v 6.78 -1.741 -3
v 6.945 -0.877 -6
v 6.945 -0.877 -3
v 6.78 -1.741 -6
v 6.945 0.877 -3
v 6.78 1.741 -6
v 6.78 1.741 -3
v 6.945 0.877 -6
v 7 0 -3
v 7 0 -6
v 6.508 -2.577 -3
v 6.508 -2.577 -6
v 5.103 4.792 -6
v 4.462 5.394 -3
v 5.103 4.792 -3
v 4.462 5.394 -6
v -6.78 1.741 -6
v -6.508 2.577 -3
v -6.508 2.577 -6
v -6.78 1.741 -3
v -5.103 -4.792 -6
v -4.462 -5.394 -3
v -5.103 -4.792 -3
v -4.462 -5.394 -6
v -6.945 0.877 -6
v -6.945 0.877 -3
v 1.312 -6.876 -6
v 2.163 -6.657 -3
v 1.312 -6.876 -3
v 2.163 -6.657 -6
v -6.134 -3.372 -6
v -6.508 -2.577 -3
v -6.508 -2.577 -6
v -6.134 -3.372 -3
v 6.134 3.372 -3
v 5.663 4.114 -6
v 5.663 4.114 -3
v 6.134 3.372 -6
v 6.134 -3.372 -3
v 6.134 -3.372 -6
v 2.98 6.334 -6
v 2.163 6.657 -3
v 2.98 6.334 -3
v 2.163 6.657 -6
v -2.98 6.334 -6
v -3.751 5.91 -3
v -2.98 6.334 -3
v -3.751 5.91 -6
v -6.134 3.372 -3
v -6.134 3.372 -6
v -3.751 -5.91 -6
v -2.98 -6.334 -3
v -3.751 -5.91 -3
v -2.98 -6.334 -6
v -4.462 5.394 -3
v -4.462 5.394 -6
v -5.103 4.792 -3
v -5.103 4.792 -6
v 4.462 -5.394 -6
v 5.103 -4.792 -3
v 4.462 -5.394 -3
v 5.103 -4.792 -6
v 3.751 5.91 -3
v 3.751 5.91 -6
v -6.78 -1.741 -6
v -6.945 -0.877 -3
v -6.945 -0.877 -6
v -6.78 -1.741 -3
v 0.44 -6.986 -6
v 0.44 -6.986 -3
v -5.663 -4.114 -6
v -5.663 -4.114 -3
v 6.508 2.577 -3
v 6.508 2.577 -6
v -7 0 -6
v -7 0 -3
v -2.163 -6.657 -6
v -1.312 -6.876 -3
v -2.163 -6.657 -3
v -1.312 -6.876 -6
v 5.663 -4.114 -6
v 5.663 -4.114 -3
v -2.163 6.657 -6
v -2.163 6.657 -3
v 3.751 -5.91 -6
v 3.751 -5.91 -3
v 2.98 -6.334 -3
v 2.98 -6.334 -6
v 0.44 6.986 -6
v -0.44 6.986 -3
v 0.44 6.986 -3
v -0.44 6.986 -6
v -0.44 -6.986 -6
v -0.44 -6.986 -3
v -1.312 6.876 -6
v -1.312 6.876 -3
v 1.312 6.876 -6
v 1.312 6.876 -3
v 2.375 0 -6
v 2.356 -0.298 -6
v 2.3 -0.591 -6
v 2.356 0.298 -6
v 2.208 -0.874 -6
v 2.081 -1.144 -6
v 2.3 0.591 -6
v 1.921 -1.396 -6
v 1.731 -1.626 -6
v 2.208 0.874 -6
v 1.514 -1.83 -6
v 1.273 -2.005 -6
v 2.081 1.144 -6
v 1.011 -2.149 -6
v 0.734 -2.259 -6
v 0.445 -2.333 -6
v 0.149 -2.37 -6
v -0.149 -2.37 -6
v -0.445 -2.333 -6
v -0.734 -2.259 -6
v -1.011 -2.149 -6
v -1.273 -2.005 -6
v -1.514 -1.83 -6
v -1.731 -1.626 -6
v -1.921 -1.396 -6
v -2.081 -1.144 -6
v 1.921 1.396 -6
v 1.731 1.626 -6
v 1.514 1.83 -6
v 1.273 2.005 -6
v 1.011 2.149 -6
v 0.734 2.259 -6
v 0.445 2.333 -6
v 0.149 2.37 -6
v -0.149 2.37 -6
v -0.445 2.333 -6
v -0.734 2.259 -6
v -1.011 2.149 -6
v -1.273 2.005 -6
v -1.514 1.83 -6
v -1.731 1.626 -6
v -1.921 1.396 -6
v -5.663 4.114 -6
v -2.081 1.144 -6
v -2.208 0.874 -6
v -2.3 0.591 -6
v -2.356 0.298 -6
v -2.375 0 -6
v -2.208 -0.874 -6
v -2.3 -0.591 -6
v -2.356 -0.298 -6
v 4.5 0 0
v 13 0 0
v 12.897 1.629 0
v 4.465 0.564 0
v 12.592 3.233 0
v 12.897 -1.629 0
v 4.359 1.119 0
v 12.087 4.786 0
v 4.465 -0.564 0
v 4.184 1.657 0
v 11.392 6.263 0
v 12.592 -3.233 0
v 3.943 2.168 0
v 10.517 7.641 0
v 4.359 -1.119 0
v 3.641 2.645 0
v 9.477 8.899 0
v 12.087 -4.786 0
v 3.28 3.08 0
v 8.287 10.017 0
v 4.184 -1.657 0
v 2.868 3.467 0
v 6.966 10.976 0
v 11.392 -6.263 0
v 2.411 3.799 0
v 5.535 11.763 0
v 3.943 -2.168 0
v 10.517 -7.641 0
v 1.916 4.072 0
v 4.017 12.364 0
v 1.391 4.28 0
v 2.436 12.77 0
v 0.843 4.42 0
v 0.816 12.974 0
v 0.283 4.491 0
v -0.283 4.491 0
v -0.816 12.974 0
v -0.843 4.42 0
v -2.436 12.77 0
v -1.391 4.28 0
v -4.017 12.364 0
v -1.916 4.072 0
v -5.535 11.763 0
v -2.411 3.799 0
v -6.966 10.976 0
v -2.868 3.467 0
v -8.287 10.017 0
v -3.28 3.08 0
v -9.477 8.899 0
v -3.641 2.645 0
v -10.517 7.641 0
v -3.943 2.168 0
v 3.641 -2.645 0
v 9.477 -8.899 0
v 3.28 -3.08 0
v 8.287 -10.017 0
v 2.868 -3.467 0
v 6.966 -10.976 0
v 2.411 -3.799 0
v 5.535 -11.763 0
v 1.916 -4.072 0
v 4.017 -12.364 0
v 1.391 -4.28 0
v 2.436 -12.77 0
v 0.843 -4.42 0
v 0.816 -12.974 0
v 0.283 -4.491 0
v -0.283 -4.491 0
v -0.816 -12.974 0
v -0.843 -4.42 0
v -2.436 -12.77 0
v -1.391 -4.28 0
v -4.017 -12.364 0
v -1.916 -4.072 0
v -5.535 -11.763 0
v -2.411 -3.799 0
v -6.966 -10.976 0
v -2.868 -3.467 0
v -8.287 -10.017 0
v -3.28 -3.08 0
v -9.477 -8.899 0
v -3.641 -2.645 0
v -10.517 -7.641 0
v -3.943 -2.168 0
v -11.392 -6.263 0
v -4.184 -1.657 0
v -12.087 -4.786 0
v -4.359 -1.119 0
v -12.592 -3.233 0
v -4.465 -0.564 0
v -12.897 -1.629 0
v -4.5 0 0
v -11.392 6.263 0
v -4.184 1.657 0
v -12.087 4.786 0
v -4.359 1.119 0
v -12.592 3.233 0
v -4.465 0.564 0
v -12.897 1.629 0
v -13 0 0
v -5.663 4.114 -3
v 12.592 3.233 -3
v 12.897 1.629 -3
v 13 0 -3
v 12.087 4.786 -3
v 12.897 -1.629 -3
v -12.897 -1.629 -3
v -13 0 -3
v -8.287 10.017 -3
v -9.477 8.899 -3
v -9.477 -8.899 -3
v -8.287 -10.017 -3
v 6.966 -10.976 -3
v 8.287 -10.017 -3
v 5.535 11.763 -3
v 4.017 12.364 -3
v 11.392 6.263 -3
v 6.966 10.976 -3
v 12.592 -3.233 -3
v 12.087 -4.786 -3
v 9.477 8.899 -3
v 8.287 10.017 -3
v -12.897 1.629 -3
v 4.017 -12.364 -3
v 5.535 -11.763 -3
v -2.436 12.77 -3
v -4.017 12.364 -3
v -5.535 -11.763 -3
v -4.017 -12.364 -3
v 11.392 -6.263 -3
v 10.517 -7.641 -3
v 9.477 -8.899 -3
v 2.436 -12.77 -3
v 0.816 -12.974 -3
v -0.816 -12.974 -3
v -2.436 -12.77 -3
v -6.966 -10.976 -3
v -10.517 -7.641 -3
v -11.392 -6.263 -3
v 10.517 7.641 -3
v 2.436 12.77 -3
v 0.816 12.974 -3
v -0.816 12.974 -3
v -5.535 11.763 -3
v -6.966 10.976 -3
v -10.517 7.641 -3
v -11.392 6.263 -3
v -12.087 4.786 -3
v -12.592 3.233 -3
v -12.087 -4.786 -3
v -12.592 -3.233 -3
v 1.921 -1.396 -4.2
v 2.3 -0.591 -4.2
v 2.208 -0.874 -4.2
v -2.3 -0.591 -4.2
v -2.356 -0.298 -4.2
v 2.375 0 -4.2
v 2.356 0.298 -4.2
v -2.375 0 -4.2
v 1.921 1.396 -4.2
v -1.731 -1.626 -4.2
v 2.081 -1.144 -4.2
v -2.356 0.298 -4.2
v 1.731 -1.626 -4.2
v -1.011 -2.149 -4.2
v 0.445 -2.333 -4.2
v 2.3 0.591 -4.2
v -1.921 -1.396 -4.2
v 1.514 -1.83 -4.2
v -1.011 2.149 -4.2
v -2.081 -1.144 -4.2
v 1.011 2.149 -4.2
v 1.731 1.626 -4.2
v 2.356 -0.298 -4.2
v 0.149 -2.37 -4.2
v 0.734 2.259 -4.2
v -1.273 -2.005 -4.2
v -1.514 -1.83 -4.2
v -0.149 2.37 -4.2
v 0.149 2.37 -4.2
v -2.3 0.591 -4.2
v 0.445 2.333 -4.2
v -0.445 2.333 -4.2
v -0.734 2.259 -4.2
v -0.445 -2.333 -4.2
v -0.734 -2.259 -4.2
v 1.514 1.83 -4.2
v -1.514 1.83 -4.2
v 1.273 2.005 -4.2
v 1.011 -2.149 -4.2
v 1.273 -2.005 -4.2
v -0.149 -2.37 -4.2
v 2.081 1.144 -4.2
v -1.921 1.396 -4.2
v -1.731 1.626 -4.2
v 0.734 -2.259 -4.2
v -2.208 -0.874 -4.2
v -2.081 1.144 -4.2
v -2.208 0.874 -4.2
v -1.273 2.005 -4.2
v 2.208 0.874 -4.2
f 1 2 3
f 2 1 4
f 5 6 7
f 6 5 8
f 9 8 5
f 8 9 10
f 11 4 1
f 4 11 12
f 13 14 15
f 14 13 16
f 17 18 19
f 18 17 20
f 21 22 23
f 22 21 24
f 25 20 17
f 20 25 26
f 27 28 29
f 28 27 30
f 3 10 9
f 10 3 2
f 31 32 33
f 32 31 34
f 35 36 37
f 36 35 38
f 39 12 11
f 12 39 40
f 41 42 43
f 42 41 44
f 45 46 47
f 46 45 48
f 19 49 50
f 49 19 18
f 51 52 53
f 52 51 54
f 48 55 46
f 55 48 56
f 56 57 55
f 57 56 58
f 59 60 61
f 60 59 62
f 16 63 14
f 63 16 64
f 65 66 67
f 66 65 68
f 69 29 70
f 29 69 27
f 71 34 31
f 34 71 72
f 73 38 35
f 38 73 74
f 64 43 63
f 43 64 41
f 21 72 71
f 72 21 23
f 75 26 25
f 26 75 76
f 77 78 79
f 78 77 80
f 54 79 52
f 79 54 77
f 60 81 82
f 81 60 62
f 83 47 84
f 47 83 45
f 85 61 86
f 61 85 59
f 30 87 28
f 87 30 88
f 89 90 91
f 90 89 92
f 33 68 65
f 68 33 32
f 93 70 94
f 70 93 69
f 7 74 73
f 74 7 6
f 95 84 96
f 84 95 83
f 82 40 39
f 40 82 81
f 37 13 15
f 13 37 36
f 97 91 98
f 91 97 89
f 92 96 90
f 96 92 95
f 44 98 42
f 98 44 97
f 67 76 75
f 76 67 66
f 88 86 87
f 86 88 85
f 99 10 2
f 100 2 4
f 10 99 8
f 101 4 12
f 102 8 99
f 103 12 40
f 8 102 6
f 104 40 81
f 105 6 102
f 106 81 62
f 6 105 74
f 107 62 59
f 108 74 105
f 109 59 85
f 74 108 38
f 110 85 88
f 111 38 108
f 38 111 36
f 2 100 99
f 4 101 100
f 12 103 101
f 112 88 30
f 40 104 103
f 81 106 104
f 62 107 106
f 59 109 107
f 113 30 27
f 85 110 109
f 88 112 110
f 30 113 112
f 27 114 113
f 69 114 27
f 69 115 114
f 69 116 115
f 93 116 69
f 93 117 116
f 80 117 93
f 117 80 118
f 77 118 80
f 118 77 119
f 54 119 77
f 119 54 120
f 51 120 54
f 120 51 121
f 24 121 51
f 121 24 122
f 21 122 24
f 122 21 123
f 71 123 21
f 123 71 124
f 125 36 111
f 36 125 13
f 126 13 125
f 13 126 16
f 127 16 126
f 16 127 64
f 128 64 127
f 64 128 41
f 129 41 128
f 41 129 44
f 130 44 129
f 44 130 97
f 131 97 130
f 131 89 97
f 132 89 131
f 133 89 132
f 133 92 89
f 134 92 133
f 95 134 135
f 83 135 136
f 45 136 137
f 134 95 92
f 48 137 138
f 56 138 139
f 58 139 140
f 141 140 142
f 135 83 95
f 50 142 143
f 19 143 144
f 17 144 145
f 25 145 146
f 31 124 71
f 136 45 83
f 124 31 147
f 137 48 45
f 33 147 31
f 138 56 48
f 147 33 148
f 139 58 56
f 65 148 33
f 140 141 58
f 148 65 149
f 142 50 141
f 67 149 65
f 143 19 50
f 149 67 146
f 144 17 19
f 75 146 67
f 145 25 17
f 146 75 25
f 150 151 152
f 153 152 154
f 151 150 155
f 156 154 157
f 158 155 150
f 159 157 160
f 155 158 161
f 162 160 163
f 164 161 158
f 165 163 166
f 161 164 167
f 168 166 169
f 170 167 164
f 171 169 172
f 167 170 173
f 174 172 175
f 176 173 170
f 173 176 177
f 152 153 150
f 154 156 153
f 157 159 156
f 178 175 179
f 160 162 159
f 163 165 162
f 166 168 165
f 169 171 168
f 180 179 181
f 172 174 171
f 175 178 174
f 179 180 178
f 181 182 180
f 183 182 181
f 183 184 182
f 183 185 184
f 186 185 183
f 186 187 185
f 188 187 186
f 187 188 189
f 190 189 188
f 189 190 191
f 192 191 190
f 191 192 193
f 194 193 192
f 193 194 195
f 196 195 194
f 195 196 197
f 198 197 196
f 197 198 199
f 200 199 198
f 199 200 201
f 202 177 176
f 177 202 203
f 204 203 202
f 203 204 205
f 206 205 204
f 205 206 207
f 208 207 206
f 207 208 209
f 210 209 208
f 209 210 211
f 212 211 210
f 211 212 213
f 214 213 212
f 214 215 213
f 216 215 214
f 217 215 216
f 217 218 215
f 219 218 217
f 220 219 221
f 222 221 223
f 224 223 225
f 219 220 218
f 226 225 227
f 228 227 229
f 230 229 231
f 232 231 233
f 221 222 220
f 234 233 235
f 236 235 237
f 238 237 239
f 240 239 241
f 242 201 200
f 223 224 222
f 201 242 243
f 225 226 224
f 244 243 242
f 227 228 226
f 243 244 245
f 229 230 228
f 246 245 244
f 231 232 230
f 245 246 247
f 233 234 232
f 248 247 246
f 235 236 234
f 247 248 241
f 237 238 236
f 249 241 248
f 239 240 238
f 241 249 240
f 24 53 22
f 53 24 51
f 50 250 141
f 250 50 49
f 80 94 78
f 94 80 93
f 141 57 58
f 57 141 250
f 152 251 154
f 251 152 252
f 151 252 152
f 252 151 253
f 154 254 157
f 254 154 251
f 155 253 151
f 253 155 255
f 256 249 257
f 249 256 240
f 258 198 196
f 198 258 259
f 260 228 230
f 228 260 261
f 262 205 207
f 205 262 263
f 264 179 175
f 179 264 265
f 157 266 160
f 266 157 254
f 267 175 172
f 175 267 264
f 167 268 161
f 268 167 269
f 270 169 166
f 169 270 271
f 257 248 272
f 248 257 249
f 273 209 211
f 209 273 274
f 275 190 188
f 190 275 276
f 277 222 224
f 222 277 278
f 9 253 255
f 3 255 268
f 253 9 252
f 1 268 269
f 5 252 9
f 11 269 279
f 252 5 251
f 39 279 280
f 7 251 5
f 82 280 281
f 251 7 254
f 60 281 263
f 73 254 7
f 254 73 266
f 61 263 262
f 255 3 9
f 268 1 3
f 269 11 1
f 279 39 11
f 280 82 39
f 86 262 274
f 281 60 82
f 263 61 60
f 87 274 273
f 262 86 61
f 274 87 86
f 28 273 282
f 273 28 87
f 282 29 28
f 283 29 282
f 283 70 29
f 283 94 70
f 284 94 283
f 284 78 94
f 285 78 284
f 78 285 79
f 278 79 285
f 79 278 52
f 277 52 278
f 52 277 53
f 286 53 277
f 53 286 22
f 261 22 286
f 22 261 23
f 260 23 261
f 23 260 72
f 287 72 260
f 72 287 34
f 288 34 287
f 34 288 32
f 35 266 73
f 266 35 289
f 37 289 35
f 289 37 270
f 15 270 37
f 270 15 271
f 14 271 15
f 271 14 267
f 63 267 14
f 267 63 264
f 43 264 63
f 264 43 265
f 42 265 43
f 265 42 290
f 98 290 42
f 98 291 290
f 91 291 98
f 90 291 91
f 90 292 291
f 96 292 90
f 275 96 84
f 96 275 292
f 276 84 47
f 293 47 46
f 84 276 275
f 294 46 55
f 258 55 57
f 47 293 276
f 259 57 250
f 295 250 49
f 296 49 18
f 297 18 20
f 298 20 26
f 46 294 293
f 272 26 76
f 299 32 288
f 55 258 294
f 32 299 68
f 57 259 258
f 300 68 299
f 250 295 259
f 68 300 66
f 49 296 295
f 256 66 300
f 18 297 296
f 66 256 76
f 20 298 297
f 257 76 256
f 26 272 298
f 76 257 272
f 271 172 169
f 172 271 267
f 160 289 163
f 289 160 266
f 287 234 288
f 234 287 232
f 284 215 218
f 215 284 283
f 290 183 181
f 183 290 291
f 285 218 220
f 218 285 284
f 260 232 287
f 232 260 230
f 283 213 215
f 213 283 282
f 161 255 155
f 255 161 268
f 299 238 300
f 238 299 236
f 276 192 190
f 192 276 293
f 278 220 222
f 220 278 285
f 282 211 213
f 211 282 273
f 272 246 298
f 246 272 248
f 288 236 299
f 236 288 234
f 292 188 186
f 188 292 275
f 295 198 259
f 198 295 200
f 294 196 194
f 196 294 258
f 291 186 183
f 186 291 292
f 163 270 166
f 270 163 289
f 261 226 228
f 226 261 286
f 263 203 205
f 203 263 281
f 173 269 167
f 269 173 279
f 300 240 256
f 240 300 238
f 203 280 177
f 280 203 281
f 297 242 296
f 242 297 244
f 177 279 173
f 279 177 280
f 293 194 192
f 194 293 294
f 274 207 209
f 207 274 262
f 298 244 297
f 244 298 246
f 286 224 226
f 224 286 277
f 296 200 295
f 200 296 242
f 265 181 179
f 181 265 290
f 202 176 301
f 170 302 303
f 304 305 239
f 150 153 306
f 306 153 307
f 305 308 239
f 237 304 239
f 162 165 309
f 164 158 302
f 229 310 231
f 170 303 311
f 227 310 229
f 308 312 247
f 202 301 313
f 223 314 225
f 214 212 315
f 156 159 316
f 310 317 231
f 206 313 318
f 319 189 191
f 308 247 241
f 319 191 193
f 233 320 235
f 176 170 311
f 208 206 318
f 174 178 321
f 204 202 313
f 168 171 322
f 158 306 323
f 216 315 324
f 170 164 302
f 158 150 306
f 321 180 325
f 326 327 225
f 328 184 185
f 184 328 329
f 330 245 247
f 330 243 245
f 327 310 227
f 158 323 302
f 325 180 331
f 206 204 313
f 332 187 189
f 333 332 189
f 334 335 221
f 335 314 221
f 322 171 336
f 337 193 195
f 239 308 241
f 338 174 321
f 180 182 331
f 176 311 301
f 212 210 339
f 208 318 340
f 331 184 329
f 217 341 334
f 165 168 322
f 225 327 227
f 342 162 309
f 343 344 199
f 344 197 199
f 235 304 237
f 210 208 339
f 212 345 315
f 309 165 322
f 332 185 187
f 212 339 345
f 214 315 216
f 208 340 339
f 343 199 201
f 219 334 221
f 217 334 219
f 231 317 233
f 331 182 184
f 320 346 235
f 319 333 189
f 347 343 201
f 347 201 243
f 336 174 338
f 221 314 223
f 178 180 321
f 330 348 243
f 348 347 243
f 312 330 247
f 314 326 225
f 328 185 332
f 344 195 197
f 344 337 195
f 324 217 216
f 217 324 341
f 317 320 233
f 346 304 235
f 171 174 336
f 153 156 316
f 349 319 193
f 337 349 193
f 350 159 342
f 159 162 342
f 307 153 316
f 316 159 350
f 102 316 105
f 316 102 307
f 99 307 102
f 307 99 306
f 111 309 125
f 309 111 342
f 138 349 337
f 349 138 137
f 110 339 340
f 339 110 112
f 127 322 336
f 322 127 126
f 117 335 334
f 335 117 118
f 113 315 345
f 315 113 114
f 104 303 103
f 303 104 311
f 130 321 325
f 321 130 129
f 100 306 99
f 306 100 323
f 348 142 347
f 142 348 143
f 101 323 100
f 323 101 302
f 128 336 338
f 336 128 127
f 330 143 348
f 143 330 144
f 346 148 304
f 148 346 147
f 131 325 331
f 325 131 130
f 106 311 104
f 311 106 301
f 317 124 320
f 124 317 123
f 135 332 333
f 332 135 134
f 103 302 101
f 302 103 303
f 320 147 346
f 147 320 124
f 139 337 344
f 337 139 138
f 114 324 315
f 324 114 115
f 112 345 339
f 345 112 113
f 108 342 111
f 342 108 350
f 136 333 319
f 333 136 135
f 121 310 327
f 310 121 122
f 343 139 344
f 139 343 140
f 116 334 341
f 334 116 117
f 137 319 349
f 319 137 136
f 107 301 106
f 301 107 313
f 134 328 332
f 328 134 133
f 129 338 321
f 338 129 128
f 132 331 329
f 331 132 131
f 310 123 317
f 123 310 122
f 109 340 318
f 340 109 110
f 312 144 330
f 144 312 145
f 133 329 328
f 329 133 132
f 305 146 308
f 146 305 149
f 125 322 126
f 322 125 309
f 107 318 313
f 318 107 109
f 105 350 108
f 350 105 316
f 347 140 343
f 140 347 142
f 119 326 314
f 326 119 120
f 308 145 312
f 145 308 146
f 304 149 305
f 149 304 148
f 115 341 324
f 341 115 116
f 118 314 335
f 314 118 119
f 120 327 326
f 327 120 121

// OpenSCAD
$fn = 50;


difference() {
	union() {
		translate(v = [0, 0, -6.0000000000]) {
			cylinder(h = 6, r = 7.0000000000);
		}
		translate(v = [0, 0, -3.0000000000]) {
			cylinder(h = 3, r = 13.0000000000);
		}
	}
	union() {
		translate(v = [0, 0, 0]) {
			rotate(a = [0, 0, 0]) {
				difference() {
					union() {
						#translate(v = [0, 0, -6.0000000000]) {
							cylinder(h = 6, r = 2.2500000000);
						}
						#translate(v = [0, 0, -4.2000000000]) {
							cylinder(h = 4.2000000000, r = 7.0000000000, r1 = 2.3750000000, r2 = 4.5000000000);
						}
						#translate(v = [0, 0, -6.0000000000]) {
							cylinder(h = 6, r = 2.3750000000);
						}
						#translate(v = [0, 0, -6.0000000000]) {
							cylinder(h = 6, r = 2.2500000000);
						}
					}
					union();
				}
			}
		}
	}
}
